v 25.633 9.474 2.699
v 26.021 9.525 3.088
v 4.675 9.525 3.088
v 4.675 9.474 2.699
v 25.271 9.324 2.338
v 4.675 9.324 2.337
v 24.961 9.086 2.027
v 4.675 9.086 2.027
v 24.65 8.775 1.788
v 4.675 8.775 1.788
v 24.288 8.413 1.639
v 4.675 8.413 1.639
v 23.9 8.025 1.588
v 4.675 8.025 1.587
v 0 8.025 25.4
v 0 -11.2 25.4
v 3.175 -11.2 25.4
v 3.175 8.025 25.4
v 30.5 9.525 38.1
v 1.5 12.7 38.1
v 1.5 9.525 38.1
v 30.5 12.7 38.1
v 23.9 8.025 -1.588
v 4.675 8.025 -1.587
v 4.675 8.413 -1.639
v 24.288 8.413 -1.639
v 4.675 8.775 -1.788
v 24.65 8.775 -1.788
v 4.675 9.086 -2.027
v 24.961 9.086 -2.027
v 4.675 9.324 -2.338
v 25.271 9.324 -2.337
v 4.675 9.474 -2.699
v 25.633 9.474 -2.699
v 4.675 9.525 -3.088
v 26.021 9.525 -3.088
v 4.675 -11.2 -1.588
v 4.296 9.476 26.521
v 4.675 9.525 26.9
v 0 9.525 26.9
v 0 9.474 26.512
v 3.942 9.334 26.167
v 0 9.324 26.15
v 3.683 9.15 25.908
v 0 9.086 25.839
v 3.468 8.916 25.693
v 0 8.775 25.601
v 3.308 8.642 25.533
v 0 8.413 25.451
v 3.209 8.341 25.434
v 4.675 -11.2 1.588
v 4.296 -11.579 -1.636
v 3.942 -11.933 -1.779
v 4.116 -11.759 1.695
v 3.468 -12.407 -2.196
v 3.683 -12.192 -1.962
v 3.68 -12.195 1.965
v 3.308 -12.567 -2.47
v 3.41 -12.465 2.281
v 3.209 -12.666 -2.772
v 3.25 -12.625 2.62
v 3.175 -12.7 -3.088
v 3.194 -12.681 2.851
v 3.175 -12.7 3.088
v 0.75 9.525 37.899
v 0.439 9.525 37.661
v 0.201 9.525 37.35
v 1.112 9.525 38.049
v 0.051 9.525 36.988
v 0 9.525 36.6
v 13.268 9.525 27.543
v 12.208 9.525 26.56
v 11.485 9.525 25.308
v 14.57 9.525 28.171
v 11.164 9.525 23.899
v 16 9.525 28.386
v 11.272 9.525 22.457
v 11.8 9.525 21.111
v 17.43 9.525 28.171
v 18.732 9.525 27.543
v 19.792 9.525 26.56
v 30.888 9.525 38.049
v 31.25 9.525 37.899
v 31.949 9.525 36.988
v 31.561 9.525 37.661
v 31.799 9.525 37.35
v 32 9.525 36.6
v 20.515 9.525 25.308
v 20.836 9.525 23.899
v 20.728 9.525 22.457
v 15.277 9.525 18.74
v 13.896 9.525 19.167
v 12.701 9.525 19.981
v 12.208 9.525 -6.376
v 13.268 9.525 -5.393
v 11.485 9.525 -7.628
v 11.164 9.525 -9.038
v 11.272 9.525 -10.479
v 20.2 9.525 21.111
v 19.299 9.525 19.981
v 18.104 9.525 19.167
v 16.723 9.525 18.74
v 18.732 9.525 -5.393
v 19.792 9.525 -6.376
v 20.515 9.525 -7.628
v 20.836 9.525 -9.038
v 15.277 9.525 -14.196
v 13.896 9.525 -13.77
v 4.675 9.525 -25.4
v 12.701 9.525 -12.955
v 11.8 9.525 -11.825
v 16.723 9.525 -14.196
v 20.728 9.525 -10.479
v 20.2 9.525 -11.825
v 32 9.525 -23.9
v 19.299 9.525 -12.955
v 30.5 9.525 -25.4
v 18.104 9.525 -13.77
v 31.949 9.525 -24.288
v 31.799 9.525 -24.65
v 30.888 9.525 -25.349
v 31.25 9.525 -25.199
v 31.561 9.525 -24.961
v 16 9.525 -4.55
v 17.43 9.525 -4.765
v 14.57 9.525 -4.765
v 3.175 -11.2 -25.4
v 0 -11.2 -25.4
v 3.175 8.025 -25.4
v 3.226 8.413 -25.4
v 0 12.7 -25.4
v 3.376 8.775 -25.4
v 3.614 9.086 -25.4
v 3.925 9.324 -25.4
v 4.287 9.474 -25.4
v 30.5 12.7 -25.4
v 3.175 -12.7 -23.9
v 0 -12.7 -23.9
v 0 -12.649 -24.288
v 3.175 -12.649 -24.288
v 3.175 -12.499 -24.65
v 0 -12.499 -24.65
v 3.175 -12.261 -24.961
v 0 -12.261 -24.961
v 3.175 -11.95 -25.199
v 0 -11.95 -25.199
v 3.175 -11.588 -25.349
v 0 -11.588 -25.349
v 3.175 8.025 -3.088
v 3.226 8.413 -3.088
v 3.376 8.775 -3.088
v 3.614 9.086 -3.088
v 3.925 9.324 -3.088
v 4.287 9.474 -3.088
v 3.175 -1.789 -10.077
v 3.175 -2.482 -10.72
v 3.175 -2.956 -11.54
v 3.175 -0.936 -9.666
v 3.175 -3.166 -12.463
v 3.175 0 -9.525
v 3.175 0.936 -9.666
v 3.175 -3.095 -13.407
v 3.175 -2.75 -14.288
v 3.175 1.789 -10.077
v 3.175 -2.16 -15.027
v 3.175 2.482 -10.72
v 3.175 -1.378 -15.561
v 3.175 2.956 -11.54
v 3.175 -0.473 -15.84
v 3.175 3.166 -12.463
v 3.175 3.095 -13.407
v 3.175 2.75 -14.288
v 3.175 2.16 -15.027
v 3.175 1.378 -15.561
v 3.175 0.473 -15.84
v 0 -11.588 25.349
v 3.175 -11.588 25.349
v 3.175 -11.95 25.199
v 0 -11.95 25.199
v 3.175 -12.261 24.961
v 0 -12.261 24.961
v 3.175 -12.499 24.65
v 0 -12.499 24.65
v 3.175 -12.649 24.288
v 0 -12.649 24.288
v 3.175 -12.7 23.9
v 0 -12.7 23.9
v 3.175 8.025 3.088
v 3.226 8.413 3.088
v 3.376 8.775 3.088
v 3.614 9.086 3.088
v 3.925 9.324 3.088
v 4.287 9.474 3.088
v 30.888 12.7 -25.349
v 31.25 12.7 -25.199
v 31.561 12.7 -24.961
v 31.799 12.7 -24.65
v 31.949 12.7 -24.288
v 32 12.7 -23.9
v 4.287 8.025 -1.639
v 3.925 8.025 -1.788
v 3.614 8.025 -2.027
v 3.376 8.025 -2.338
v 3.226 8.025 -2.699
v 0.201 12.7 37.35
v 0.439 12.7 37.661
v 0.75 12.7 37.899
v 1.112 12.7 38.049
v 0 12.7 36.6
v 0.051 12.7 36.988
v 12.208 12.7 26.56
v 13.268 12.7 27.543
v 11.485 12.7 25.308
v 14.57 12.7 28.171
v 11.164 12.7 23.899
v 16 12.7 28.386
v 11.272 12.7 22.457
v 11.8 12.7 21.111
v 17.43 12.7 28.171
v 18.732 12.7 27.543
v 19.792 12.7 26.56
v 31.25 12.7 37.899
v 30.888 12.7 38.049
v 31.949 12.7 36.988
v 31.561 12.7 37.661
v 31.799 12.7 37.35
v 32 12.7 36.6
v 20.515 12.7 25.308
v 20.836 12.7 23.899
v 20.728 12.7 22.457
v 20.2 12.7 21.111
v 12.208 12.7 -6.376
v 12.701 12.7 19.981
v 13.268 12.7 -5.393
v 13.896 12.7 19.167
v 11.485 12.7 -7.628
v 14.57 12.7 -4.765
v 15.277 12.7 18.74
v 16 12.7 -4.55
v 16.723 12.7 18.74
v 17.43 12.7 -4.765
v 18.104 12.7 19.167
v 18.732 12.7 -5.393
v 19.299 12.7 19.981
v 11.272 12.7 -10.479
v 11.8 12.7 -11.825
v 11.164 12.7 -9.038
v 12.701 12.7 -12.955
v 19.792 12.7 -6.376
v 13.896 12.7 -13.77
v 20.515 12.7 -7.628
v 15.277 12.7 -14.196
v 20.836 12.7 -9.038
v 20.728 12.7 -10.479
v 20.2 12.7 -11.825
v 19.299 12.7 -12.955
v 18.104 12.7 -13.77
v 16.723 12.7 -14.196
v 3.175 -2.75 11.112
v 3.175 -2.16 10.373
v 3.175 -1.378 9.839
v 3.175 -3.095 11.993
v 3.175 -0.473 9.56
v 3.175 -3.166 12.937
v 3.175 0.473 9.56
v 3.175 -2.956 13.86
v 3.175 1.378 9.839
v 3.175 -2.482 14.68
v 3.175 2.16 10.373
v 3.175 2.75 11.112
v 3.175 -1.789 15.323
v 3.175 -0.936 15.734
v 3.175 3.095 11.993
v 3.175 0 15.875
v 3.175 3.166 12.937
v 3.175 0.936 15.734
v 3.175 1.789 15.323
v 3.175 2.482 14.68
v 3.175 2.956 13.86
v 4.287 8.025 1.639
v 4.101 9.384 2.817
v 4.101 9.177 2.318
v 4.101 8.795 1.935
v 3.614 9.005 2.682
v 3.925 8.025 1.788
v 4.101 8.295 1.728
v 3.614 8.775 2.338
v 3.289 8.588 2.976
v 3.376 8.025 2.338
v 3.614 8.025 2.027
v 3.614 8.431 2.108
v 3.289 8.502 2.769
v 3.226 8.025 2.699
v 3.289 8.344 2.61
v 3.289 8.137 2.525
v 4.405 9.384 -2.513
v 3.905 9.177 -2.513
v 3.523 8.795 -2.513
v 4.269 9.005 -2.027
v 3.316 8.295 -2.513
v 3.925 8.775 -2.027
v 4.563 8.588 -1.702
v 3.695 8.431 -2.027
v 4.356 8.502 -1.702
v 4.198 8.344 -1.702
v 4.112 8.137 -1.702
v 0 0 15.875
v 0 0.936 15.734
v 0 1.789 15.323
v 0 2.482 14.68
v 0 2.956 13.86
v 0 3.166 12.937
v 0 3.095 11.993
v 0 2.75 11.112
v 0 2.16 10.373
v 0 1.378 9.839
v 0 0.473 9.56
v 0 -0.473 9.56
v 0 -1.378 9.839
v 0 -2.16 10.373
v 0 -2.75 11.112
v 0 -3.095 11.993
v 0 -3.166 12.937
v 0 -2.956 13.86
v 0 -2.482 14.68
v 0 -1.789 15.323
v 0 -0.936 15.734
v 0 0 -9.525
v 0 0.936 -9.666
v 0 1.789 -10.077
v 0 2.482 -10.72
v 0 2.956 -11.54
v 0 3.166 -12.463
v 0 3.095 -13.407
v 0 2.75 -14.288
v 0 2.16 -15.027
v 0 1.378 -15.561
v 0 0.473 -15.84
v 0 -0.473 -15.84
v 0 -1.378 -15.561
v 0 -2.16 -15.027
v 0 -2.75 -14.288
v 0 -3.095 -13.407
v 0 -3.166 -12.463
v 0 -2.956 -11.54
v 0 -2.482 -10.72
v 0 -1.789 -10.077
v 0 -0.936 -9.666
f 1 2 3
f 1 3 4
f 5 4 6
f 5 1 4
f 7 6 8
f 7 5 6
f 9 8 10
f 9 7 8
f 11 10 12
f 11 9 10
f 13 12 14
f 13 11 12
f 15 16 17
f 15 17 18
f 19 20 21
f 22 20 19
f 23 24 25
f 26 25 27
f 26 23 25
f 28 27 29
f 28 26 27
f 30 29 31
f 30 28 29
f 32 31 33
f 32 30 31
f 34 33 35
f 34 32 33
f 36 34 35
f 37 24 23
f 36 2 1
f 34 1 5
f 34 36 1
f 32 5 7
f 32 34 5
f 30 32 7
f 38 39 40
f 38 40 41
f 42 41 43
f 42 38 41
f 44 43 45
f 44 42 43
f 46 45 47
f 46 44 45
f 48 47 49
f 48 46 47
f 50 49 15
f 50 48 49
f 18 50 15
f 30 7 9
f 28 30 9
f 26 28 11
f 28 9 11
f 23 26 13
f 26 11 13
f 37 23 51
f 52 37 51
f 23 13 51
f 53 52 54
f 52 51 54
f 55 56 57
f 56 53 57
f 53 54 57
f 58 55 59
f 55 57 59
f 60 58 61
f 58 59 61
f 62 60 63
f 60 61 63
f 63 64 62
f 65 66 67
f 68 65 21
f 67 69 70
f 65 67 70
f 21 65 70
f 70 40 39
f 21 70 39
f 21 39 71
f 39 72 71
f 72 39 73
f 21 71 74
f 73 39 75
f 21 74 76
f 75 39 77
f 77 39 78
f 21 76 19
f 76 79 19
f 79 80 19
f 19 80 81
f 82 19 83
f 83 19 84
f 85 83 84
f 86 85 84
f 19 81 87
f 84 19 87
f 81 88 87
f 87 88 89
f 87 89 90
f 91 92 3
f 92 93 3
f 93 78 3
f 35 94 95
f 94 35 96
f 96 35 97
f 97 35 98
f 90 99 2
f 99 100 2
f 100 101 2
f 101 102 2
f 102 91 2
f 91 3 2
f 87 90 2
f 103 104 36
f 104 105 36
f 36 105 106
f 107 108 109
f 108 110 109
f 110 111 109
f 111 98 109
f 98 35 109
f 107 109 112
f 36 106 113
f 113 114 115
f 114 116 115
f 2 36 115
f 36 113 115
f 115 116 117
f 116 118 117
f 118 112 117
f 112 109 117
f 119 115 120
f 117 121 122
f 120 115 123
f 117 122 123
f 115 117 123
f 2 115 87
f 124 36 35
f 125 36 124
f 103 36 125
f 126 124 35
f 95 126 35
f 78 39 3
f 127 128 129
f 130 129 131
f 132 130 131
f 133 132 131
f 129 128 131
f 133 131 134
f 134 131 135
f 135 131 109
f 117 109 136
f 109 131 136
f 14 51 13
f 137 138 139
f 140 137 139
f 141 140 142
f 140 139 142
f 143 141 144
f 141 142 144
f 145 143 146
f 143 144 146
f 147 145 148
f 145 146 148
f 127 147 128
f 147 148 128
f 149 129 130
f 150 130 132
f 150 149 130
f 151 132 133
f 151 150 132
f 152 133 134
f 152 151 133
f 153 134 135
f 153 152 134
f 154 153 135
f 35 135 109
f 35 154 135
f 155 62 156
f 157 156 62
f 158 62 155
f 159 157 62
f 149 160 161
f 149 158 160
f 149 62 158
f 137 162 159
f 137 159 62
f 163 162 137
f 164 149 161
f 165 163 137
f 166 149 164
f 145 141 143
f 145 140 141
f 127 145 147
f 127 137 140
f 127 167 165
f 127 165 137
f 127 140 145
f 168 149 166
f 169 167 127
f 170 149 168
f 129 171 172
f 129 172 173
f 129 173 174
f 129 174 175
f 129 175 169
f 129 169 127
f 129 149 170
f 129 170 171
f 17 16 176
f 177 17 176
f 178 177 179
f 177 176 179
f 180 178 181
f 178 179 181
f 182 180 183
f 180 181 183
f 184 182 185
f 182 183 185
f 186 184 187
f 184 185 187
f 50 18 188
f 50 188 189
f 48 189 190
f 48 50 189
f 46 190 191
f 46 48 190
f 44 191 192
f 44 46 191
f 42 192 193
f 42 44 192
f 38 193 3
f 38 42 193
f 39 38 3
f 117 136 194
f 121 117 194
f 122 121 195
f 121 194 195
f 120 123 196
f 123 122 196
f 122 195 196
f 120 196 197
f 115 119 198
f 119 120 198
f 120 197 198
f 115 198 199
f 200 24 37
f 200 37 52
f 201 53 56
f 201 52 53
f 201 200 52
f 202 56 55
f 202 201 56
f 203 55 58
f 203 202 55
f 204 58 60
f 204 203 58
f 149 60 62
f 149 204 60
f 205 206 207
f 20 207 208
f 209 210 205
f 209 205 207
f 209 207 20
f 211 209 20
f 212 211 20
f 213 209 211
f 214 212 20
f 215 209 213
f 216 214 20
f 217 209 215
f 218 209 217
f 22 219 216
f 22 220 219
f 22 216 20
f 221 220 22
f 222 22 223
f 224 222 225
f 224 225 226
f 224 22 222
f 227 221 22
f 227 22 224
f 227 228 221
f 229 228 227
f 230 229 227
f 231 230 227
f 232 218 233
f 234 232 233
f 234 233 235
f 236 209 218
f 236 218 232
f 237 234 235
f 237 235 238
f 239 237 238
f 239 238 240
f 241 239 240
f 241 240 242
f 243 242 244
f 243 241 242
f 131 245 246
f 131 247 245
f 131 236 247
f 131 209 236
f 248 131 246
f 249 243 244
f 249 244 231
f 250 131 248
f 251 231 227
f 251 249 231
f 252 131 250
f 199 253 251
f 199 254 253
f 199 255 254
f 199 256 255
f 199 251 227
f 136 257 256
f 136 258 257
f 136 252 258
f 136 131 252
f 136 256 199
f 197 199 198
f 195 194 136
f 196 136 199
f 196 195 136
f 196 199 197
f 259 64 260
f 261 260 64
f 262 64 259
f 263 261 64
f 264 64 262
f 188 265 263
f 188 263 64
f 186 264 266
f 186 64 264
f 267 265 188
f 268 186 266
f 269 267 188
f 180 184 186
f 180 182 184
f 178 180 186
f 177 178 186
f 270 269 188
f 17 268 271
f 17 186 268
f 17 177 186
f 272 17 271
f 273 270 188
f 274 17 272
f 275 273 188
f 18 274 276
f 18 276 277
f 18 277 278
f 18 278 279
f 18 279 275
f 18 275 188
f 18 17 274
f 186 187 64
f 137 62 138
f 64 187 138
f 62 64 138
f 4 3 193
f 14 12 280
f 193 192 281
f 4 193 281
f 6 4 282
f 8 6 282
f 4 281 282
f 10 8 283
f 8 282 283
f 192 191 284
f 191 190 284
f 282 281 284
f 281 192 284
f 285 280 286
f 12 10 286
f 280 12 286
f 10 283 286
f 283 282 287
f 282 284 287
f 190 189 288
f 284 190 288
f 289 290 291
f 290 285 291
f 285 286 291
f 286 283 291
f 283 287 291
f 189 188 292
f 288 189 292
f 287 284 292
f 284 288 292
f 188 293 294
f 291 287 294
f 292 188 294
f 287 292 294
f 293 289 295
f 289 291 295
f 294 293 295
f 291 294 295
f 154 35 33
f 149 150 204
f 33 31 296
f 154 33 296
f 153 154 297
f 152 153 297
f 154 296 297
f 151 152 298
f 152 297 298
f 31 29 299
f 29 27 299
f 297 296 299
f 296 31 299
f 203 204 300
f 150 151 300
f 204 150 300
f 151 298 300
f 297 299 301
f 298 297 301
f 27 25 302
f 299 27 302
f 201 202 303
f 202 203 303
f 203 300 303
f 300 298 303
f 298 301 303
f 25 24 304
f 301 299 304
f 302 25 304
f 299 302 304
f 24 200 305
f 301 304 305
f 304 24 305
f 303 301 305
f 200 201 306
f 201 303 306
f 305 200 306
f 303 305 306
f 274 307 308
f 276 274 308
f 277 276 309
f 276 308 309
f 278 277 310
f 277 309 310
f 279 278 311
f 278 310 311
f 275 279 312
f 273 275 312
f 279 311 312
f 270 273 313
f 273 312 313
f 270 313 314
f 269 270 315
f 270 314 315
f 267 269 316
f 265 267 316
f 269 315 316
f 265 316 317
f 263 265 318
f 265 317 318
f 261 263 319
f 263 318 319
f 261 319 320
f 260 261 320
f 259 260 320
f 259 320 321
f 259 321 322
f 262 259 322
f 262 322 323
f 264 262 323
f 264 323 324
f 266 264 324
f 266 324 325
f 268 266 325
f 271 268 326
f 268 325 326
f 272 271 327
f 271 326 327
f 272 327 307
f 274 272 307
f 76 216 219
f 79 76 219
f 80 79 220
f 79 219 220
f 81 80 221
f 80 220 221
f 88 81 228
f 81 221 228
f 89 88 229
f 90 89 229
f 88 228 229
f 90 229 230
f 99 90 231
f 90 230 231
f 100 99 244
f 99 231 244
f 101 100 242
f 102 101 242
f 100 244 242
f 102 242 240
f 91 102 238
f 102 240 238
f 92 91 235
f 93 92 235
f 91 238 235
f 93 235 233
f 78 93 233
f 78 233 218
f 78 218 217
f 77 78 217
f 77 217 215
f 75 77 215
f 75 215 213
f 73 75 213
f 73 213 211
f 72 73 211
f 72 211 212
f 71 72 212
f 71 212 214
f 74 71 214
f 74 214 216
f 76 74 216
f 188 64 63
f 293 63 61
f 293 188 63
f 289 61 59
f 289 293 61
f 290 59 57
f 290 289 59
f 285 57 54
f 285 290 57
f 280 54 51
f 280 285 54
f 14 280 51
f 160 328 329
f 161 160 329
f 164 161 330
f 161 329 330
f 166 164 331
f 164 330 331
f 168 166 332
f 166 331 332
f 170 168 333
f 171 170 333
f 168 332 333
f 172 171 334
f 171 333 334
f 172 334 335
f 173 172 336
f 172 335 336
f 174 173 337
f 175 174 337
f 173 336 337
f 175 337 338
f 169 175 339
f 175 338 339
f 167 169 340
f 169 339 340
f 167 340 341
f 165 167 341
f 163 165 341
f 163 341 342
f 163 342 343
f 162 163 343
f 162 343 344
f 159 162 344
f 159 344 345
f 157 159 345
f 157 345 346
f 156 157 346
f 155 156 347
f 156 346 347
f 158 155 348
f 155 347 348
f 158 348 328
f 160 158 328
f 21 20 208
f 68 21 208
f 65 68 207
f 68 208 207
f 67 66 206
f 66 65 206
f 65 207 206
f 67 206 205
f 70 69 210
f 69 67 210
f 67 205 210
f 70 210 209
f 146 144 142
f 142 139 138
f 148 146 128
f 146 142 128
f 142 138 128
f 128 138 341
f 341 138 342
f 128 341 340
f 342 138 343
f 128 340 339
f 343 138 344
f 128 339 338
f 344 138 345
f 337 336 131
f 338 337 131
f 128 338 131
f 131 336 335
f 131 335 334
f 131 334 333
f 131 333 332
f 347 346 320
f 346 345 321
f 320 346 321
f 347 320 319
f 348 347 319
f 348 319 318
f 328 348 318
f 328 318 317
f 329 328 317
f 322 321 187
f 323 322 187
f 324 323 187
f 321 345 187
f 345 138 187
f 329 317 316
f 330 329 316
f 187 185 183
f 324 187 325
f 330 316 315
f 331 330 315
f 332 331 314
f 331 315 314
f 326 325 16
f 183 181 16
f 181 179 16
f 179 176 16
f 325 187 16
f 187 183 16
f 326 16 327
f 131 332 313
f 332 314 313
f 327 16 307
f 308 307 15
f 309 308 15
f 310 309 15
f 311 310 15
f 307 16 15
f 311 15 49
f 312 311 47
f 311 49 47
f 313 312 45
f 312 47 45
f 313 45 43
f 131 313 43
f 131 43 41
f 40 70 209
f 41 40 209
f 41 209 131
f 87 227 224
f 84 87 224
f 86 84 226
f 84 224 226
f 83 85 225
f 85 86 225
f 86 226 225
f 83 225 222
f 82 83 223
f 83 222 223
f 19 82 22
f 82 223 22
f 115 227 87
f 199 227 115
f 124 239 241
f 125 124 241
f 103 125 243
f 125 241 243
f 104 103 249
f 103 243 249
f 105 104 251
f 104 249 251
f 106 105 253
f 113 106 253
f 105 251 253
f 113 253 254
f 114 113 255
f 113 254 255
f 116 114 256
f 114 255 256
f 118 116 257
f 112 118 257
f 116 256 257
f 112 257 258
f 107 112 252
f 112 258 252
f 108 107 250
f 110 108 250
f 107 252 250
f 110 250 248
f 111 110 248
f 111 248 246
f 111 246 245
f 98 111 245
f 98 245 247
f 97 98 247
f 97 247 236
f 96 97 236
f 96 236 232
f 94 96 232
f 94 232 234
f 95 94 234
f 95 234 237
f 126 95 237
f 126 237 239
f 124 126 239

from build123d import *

# Parameters (mm, degrees)
SKETCH2_W           = 50.8
SKETCH2_H           = 25.4
BOSS_EXTRUDE1_DEPTH = 3.175
SKETCH4_W           = 32
SKETCH4_H           = 63.5
BOSS_EXTRUDE2_DEPTH = 3.175
SKETCH6_R           = 3.175
CUT_EXTRUDE2_DEPTH  = 3.175
BOSS_EXTRUDE3_DEPTH = 1.5875
SKETCH8_R           = 4.85
CUT_EXTRUDE3_DEPTH  = 10
FILLET3_R           = 1.5


with BuildPart() as part:
    # Sketch2 → Boss-Extrude1 (new body)
    with BuildSketch(Plane(origin=(0, 0, 0), x_dir=(0, 0, -1), z_dir=(1, 0, 0))):
        Rectangle(SKETCH2_W, SKETCH2_H)
    extrude(amount=BOSS_EXTRUDE1_DEPTH)

    # Sketch4 → Boss-Extrude2 (add)
    with BuildSketch(Plane(origin=(0, 12.7, 0), x_dir=(1, 0, 0), z_dir=(0, 1, 0))):
        with Locations((16, -6.35)):
            Rectangle(SKETCH4_W, SKETCH4_H)
    extrude(amount=-BOSS_EXTRUDE2_DEPTH)

    # Sketch6 → Cut-Extrude2 (cut)
    with BuildSketch(Plane.ZY):
        with Locations((-12.7, 0)):
            Circle(SKETCH6_R)
        with Locations((12.7, 0)):
            Circle(SKETCH6_R)
    extrude(amount=-CUT_EXTRUDE2_DEPTH, mode=Mode.SUBTRACT)

    # Sketch7 → Boss-Extrude3 (add, symmetric)
    with BuildSketch(Plane.XY):
        Polygon((3.175, -12.7), (25.4, 9.525), (3.175, 9.525), align=None)
    extrude(amount=BOSS_EXTRUDE3_DEPTH, both=True)

    # Sketch8 → Cut-Extrude3 (cut)
    with BuildSketch(Plane(origin=(0, 12.7, 0), x_dir=(1, 0, 0), z_dir=(0, 1, 0))):
        with Locations(Location((16, 9.4, 0), (0, 0, 270))):
            Circle(SKETCH8_R)
        with Locations(Location((16, -23.536231777, 0), (0, 0, 270))):
            Circle(SKETCH8_R)
    extrude(amount=-CUT_EXTRUDE3_DEPTH, mode=Mode.SUBTRACT)

    # Fillet3
    # the kernel refuses this fillet: 1.5 mm, written as the material it adds along each edge
    with BuildSketch(Plane(origin=(4.675, 8.025, 3.0875), x_dir=(0, 0, -1), z_dir=(-1, 0, 0))) as fillet3_piece_1_section:
        Polygon((0, 0), (FILLET3_R, 0), (FILLET3_R, -FILLET3_R), (0, -FILLET3_R), align=None)
    fillet3_piece_1 = extrude(amount=FILLET3_R, mode=Mode.PRIVATE)
    fillet3_piece_1 = fillet3_piece_1 - Plane(origin=(4.675, 8.025, 3.0875), x_dir=(0, -0.7071067811865475, 0.7071067811865475), z_dir=(-1, 0, 0)) * Sphere(FILLET3_R, mode=Mode.PRIVATE)
    add(fillet3_piece_1)
    with BuildSketch(Plane(origin=(4.675, 8.025, -3.0875), x_dir=(-1, 0, 0), z_dir=(0, 0, 1))) as fillet3_piece_2_section:
        Polygon((0, 0), (FILLET3_R, 0), (FILLET3_R, -FILLET3_R), (0, -FILLET3_R), align=None)
    fillet3_piece_2 = extrude(amount=FILLET3_R, mode=Mode.PRIVATE)
    fillet3_piece_2 = fillet3_piece_2 - Plane(origin=(4.675, 8.025, -3.0875), x_dir=(0.7071067811865475, -0.7071067811865475, 0), z_dir=(0, 0, 1)) * Sphere(FILLET3_R, mode=Mode.PRIVATE)
    add(fillet3_piece_2)
    with BuildSketch(Plane(origin=(3.175, 9.525, 25.4), x_dir=(0, -1, 0), z_dir=(-1, 0, 0))) as fillet3_piece_3:
        with BuildLine():
            CenterArc((FILLET3_R, FILLET3_R), FILLET3_R, 180, 90)
            Line((0, FILLET3_R), (0, 0))
            Line((0, 0), (FILLET3_R, 0))
        make_face()
    extrude(amount=3.175)
    with BuildSketch(Plane(origin=(3.175, 9.525, 25.4), x_dir=(0, -1, 0), z_dir=(0, 0, -1)), Plane(origin=(3.175, 9.525, -3.0875), x_dir=(0, -1, 0), z_dir=(0, 0, -1))) as fillet3_piece_4:
        with BuildLine():
            CenterArc((FILLET3_R, -FILLET3_R), FILLET3_R, 90, 90)
            Line((0, -FILLET3_R), (0, 0))
            Line((0, 0), (FILLET3_R, 0))
        make_face()
    extrude(amount=22.3125)
    with BuildSketch(Plane(origin=(29.15, 9.525, -1.5875), x_dir=(0, 0, -1), z_dir=(-1, 0, 0))) as fillet3_piece_5_section:
        with BuildLine():
            CenterArc((FILLET3_R, FILLET3_R), FILLET3_R, 180, 90)
            Line((0, FILLET3_R), (0, 0))
            Line((0, 0), (FILLET3_R, 0))
        make_face()
    fillet3_piece_5 = extrude(amount=24.475, mode=Mode.PRIVATE)
    fillet3_piece_5 = split(fillet3_piece_5, bisect_by=Plane(origin=(19.967902823, 4.092902823, -1.930123153), z_dir=(-0.707106781186549, 0.707106781186546, 0)), keep=Keep.TOP, mode=Mode.PRIVATE)
    add(fillet3_piece_5)
    with BuildSketch(Plane(origin=(25.4, 9.525, -1.5875), x_dir=(-0.7071067811865489, -0.7071067811865461, 0), z_dir=(0, 0, 1))) as fillet3_piece_6:
        with BuildLine():
            CenterArc((FILLET3_R * 0.414213562373, FILLET3_R), FILLET3_R, 225, 45)
            Line((-FILLET3_R * 0.292893218813, FILLET3_R * 0.292893218813), (0, 0))
            Line((0, 0), (FILLET3_R * 0.414213562373, 0))
        make_face()
    extrude(amount=3.175)
    with BuildSketch(Plane(origin=(3.175, 8.025, -1.5875), x_dir=(0, 0, -1), z_dir=(0, -1, 0))) as fillet3_piece_7_section:
        with BuildLine():
            CenterArc((FILLET3_R, FILLET3_R), FILLET3_R, 180, 90)
            Line((0, FILLET3_R), (0, 0))
            Line((0, 0), (FILLET3_R, 0))
        make_face()
    fillet3_piece_7 = extrude(amount=20.725, mode=Mode.PRIVATE)
    fillet3_piece_7 = split(fillet3_piece_7, bisect_by=Plane(origin=(8.60741784, -7.26758216, -1.930100054), z_dir=(-0.707106781186549, 0.707106781186546, 0)), keep=Keep.TOP, mode=Mode.PRIVATE)
    add(fillet3_piece_7)
    with BuildSketch(Plane(origin=(29.15, 9.525, 1.5875), x_dir=(0, 0, 1), z_dir=(-1, 0, 0))) as fillet3_piece_8_section:
        with BuildLine():
            CenterArc((FILLET3_R, -FILLET3_R), FILLET3_R, 90, 90)
            Line((0, -FILLET3_R), (0, 0))
            Line((0, 0), (FILLET3_R, 0))
        make_face()
    fillet3_piece_8 = extrude(amount=24.475, mode=Mode.PRIVATE)
    fillet3_piece_8 = split(fillet3_piece_8, bisect_by=Plane(origin=(19.967902823, 4.092902823, 1.930123153), z_dir=(-0.707106781186549, 0.707106781186546, 0)), keep=Keep.TOP, mode=Mode.PRIVATE)
    add(fillet3_piece_8)
    with BuildSketch(Plane(origin=(3.175, 8.025, 1.5875), x_dir=(0, 0, 1), z_dir=(0, -1, 0))) as fillet3_piece_9_section:
        with BuildLine():
            CenterArc((FILLET3_R, -FILLET3_R), FILLET3_R, 90, 90)
            Line((0, -FILLET3_R), (0, 0))
            Line((0, 0), (FILLET3_R, 0))
        make_face()
    fillet3_piece_9 = extrude(amount=20.725, mode=Mode.PRIVATE)
    fillet3_piece_9 = split(fillet3_piece_9, bisect_by=Plane(origin=(8.60741784, -7.26758216, 1.930100054), z_dir=(-0.707106781186549, 0.707106781186546, 0)), keep=Keep.TOP, mode=Mode.PRIVATE)
    add(fillet3_piece_9)
    with BuildSketch(Plane(origin=(6.925, 9.525, 25.4), x_dir=(0, -1, 0), z_dir=(-1, 0, 0))) as fillet3_piece_10a_section:
        with BuildLine():
            CenterArc((FILLET3_R, FILLET3_R), FILLET3_R, 180, 90)
            Line((0, FILLET3_R), (0, 0))
            Line((0, 0), (FILLET3_R, 0))
        make_face()
    fillet3_piece_10a = extrude(amount=6.925, mode=Mode.PRIVATE)
    fillet3_piece_10a = split(fillet3_piece_10a, bisect_by=Plane(origin=(3.175, 9.185407329, 25.739592671), z_dir=(1, 0, 0)), keep=Keep.TOP, mode=Mode.PRIVATE)
    with BuildSketch(Plane(origin=(3.175, 9.525, 29.15), x_dir=(0, -1, 0), z_dir=(0, 0, -1))) as fillet3_piece_10b_section:
        with BuildLine():
            CenterArc((FILLET3_R, -FILLET3_R), FILLET3_R, 90, 90)
            Line((0, -FILLET3_R), (0, 0))
            Line((0, 0), (FILLET3_R, 0))
        make_face()
    fillet3_piece_10b = extrude(amount=26.0625, mode=Mode.PRIVATE)
    fillet3_piece_10b = split(fillet3_piece_10b, bisect_by=Plane(origin=(3.514592671, 9.185407329, 25.4), z_dir=(0, 0, 1)), keep=Keep.TOP, mode=Mode.PRIVATE)
    fillet3_piece_10 = fillet3_piece_10a & fillet3_piece_10b
    add(fillet3_piece_10)
    with BuildSketch(Plane(origin=(25.4, 9.525, -3.140800859), x_dir=(-0.7071067811865446, -0.7071067811865503, 0), z_dir=(0, 0, 1))) as fillet3_piece_11a_section:
        with BuildLine():
            CenterArc((FILLET3_R * 0.414213562373, FILLET3_R), FILLET3_R, 225, 45)
            Line((-FILLET3_R * 0.292893218813, FILLET3_R * 0.292893218813), (0, 0))
            Line((0, 0), (FILLET3_R * 0.414213562373, 0))
        make_face()
    fillet3_piece_11a = extrude(amount=4.728300859, mode=Mode.PRIVATE)
    fillet3_piece_11a = split(fillet3_piece_11a, bisect_by=Plane(origin=(25.438403899, 9.432284787, -1.5875), z_dir=(0, 0, -1)), keep=Keep.TOP, mode=Mode.PRIVATE)
    with BuildSketch(Plane(origin=(29.15, 9.525, -1.5875), x_dir=(0, 0, -1), z_dir=(-1, 0, 0))) as fillet3_piece_11b_section:
        with BuildLine():
            CenterArc((FILLET3_R, FILLET3_R), FILLET3_R, 180, 90)
            Line((0, FILLET3_R), (0, 0))
            Line((0, 0), (FILLET3_R, 0))
        make_face()
    fillet3_piece_11b = extrude(amount=24.475, mode=Mode.PRIVATE)
    fillet3_piece_11b = split(fillet3_piece_11b, bisect_by=Plane(origin=(26.063627713, 10.188627713, -1.91198662), z_dir=(0.707106781186549, -0.707106781186546, 0)), keep=Keep.TOP, mode=Mode.PRIVATE)
    fillet3_piece_11 = fillet3_piece_11a & fillet3_piece_11b
    add(fillet3_piece_11)
    with BuildSketch(Plane(origin=(25.4, 9.525, -1.5875), x_dir=(-0.7071067811865489, -0.7071067811865461, 0), z_dir=(0, 0, 1))) as fillet3_piece_12a_section:
        with BuildLine():
            CenterArc((FILLET3_R * 0.414213562373, FILLET3_R), FILLET3_R, 225, 45)
            Line((-FILLET3_R * 0.292893218813, FILLET3_R * 0.292893218813), (0, 0))
            Line((0, 0), (FILLET3_R * 0.414213562373, 0))
        make_face()
    fillet3_piece_12a = extrude(amount=4.728300859, mode=Mode.PRIVATE)
    fillet3_piece_12a = split(fillet3_piece_12a, bisect_by=Plane(origin=(25.438403899, 9.432284787, 1.5875), z_dir=(0, 0, 1)), keep=Keep.TOP, mode=Mode.PRIVATE)
    with BuildSketch(Plane(origin=(29.15, 9.525, 1.5875), x_dir=(0, 0, 1), z_dir=(-1, 0, 0))) as fillet3_piece_12b_section:
        with BuildLine():
            CenterArc((FILLET3_R, -FILLET3_R), FILLET3_R, 90, 90)
            Line((0, -FILLET3_R), (0, 0))
            Line((0, 0), (FILLET3_R, 0))
        make_face()
    fillet3_piece_12b = extrude(amount=24.475, mode=Mode.PRIVATE)
    fillet3_piece_12b = split(fillet3_piece_12b, bisect_by=Plane(origin=(26.063627713, 10.188627713, 1.91198662), z_dir=(0.707106781186549, -0.707106781186546, 0)), keep=Keep.TOP, mode=Mode.PRIVATE)
    fillet3_piece_12 = fillet3_piece_12a & fillet3_piece_12b
    add(fillet3_piece_12)
    # the kernel refuses this fillet: 1.5 mm, written as the material it takes off along each edge
    with BuildSketch(Plane(origin=(0, 16.45, 38.1), x_dir=(0, 0, -1), z_dir=(0, -1, 0)), Plane(origin=(32, 16.45, -25.4), x_dir=(0, 0, 1), z_dir=(0, -1, 0)), Plane(origin=(-3.75, -12.7, 25.4), x_dir=(0, 0, -1), z_dir=(1, 0, 0))) as fillet3_2_piece_1:
        with BuildLine():
            CenterArc((FILLET3_R, FILLET3_R), FILLET3_R, 180, 90)
            Line((0, FILLET3_R), (0, 0))
            Line((0, 0), (FILLET3_R, 0))
        make_face()
    extrude(amount=10.675, mode=Mode.SUBTRACT)
    with BuildSketch(Plane(origin=(32, 16.45, 38.1), x_dir=(0, 0, -1), z_dir=(0, -1, 0)), Plane(origin=(-3.75, -12.7, -25.4), x_dir=(0, 0, 1), z_dir=(1, 0, 0))) as fillet3_2_piece_2:
        with BuildLine():
            CenterArc((FILLET3_R, -FILLET3_R), FILLET3_R, 90, 90)
            Line((0, -FILLET3_R), (0, 0))
            Line((0, 0), (FILLET3_R, 0))
        make_face()
    extrude(amount=10.675, mode=Mode.SUBTRACT)


solid = part.part
